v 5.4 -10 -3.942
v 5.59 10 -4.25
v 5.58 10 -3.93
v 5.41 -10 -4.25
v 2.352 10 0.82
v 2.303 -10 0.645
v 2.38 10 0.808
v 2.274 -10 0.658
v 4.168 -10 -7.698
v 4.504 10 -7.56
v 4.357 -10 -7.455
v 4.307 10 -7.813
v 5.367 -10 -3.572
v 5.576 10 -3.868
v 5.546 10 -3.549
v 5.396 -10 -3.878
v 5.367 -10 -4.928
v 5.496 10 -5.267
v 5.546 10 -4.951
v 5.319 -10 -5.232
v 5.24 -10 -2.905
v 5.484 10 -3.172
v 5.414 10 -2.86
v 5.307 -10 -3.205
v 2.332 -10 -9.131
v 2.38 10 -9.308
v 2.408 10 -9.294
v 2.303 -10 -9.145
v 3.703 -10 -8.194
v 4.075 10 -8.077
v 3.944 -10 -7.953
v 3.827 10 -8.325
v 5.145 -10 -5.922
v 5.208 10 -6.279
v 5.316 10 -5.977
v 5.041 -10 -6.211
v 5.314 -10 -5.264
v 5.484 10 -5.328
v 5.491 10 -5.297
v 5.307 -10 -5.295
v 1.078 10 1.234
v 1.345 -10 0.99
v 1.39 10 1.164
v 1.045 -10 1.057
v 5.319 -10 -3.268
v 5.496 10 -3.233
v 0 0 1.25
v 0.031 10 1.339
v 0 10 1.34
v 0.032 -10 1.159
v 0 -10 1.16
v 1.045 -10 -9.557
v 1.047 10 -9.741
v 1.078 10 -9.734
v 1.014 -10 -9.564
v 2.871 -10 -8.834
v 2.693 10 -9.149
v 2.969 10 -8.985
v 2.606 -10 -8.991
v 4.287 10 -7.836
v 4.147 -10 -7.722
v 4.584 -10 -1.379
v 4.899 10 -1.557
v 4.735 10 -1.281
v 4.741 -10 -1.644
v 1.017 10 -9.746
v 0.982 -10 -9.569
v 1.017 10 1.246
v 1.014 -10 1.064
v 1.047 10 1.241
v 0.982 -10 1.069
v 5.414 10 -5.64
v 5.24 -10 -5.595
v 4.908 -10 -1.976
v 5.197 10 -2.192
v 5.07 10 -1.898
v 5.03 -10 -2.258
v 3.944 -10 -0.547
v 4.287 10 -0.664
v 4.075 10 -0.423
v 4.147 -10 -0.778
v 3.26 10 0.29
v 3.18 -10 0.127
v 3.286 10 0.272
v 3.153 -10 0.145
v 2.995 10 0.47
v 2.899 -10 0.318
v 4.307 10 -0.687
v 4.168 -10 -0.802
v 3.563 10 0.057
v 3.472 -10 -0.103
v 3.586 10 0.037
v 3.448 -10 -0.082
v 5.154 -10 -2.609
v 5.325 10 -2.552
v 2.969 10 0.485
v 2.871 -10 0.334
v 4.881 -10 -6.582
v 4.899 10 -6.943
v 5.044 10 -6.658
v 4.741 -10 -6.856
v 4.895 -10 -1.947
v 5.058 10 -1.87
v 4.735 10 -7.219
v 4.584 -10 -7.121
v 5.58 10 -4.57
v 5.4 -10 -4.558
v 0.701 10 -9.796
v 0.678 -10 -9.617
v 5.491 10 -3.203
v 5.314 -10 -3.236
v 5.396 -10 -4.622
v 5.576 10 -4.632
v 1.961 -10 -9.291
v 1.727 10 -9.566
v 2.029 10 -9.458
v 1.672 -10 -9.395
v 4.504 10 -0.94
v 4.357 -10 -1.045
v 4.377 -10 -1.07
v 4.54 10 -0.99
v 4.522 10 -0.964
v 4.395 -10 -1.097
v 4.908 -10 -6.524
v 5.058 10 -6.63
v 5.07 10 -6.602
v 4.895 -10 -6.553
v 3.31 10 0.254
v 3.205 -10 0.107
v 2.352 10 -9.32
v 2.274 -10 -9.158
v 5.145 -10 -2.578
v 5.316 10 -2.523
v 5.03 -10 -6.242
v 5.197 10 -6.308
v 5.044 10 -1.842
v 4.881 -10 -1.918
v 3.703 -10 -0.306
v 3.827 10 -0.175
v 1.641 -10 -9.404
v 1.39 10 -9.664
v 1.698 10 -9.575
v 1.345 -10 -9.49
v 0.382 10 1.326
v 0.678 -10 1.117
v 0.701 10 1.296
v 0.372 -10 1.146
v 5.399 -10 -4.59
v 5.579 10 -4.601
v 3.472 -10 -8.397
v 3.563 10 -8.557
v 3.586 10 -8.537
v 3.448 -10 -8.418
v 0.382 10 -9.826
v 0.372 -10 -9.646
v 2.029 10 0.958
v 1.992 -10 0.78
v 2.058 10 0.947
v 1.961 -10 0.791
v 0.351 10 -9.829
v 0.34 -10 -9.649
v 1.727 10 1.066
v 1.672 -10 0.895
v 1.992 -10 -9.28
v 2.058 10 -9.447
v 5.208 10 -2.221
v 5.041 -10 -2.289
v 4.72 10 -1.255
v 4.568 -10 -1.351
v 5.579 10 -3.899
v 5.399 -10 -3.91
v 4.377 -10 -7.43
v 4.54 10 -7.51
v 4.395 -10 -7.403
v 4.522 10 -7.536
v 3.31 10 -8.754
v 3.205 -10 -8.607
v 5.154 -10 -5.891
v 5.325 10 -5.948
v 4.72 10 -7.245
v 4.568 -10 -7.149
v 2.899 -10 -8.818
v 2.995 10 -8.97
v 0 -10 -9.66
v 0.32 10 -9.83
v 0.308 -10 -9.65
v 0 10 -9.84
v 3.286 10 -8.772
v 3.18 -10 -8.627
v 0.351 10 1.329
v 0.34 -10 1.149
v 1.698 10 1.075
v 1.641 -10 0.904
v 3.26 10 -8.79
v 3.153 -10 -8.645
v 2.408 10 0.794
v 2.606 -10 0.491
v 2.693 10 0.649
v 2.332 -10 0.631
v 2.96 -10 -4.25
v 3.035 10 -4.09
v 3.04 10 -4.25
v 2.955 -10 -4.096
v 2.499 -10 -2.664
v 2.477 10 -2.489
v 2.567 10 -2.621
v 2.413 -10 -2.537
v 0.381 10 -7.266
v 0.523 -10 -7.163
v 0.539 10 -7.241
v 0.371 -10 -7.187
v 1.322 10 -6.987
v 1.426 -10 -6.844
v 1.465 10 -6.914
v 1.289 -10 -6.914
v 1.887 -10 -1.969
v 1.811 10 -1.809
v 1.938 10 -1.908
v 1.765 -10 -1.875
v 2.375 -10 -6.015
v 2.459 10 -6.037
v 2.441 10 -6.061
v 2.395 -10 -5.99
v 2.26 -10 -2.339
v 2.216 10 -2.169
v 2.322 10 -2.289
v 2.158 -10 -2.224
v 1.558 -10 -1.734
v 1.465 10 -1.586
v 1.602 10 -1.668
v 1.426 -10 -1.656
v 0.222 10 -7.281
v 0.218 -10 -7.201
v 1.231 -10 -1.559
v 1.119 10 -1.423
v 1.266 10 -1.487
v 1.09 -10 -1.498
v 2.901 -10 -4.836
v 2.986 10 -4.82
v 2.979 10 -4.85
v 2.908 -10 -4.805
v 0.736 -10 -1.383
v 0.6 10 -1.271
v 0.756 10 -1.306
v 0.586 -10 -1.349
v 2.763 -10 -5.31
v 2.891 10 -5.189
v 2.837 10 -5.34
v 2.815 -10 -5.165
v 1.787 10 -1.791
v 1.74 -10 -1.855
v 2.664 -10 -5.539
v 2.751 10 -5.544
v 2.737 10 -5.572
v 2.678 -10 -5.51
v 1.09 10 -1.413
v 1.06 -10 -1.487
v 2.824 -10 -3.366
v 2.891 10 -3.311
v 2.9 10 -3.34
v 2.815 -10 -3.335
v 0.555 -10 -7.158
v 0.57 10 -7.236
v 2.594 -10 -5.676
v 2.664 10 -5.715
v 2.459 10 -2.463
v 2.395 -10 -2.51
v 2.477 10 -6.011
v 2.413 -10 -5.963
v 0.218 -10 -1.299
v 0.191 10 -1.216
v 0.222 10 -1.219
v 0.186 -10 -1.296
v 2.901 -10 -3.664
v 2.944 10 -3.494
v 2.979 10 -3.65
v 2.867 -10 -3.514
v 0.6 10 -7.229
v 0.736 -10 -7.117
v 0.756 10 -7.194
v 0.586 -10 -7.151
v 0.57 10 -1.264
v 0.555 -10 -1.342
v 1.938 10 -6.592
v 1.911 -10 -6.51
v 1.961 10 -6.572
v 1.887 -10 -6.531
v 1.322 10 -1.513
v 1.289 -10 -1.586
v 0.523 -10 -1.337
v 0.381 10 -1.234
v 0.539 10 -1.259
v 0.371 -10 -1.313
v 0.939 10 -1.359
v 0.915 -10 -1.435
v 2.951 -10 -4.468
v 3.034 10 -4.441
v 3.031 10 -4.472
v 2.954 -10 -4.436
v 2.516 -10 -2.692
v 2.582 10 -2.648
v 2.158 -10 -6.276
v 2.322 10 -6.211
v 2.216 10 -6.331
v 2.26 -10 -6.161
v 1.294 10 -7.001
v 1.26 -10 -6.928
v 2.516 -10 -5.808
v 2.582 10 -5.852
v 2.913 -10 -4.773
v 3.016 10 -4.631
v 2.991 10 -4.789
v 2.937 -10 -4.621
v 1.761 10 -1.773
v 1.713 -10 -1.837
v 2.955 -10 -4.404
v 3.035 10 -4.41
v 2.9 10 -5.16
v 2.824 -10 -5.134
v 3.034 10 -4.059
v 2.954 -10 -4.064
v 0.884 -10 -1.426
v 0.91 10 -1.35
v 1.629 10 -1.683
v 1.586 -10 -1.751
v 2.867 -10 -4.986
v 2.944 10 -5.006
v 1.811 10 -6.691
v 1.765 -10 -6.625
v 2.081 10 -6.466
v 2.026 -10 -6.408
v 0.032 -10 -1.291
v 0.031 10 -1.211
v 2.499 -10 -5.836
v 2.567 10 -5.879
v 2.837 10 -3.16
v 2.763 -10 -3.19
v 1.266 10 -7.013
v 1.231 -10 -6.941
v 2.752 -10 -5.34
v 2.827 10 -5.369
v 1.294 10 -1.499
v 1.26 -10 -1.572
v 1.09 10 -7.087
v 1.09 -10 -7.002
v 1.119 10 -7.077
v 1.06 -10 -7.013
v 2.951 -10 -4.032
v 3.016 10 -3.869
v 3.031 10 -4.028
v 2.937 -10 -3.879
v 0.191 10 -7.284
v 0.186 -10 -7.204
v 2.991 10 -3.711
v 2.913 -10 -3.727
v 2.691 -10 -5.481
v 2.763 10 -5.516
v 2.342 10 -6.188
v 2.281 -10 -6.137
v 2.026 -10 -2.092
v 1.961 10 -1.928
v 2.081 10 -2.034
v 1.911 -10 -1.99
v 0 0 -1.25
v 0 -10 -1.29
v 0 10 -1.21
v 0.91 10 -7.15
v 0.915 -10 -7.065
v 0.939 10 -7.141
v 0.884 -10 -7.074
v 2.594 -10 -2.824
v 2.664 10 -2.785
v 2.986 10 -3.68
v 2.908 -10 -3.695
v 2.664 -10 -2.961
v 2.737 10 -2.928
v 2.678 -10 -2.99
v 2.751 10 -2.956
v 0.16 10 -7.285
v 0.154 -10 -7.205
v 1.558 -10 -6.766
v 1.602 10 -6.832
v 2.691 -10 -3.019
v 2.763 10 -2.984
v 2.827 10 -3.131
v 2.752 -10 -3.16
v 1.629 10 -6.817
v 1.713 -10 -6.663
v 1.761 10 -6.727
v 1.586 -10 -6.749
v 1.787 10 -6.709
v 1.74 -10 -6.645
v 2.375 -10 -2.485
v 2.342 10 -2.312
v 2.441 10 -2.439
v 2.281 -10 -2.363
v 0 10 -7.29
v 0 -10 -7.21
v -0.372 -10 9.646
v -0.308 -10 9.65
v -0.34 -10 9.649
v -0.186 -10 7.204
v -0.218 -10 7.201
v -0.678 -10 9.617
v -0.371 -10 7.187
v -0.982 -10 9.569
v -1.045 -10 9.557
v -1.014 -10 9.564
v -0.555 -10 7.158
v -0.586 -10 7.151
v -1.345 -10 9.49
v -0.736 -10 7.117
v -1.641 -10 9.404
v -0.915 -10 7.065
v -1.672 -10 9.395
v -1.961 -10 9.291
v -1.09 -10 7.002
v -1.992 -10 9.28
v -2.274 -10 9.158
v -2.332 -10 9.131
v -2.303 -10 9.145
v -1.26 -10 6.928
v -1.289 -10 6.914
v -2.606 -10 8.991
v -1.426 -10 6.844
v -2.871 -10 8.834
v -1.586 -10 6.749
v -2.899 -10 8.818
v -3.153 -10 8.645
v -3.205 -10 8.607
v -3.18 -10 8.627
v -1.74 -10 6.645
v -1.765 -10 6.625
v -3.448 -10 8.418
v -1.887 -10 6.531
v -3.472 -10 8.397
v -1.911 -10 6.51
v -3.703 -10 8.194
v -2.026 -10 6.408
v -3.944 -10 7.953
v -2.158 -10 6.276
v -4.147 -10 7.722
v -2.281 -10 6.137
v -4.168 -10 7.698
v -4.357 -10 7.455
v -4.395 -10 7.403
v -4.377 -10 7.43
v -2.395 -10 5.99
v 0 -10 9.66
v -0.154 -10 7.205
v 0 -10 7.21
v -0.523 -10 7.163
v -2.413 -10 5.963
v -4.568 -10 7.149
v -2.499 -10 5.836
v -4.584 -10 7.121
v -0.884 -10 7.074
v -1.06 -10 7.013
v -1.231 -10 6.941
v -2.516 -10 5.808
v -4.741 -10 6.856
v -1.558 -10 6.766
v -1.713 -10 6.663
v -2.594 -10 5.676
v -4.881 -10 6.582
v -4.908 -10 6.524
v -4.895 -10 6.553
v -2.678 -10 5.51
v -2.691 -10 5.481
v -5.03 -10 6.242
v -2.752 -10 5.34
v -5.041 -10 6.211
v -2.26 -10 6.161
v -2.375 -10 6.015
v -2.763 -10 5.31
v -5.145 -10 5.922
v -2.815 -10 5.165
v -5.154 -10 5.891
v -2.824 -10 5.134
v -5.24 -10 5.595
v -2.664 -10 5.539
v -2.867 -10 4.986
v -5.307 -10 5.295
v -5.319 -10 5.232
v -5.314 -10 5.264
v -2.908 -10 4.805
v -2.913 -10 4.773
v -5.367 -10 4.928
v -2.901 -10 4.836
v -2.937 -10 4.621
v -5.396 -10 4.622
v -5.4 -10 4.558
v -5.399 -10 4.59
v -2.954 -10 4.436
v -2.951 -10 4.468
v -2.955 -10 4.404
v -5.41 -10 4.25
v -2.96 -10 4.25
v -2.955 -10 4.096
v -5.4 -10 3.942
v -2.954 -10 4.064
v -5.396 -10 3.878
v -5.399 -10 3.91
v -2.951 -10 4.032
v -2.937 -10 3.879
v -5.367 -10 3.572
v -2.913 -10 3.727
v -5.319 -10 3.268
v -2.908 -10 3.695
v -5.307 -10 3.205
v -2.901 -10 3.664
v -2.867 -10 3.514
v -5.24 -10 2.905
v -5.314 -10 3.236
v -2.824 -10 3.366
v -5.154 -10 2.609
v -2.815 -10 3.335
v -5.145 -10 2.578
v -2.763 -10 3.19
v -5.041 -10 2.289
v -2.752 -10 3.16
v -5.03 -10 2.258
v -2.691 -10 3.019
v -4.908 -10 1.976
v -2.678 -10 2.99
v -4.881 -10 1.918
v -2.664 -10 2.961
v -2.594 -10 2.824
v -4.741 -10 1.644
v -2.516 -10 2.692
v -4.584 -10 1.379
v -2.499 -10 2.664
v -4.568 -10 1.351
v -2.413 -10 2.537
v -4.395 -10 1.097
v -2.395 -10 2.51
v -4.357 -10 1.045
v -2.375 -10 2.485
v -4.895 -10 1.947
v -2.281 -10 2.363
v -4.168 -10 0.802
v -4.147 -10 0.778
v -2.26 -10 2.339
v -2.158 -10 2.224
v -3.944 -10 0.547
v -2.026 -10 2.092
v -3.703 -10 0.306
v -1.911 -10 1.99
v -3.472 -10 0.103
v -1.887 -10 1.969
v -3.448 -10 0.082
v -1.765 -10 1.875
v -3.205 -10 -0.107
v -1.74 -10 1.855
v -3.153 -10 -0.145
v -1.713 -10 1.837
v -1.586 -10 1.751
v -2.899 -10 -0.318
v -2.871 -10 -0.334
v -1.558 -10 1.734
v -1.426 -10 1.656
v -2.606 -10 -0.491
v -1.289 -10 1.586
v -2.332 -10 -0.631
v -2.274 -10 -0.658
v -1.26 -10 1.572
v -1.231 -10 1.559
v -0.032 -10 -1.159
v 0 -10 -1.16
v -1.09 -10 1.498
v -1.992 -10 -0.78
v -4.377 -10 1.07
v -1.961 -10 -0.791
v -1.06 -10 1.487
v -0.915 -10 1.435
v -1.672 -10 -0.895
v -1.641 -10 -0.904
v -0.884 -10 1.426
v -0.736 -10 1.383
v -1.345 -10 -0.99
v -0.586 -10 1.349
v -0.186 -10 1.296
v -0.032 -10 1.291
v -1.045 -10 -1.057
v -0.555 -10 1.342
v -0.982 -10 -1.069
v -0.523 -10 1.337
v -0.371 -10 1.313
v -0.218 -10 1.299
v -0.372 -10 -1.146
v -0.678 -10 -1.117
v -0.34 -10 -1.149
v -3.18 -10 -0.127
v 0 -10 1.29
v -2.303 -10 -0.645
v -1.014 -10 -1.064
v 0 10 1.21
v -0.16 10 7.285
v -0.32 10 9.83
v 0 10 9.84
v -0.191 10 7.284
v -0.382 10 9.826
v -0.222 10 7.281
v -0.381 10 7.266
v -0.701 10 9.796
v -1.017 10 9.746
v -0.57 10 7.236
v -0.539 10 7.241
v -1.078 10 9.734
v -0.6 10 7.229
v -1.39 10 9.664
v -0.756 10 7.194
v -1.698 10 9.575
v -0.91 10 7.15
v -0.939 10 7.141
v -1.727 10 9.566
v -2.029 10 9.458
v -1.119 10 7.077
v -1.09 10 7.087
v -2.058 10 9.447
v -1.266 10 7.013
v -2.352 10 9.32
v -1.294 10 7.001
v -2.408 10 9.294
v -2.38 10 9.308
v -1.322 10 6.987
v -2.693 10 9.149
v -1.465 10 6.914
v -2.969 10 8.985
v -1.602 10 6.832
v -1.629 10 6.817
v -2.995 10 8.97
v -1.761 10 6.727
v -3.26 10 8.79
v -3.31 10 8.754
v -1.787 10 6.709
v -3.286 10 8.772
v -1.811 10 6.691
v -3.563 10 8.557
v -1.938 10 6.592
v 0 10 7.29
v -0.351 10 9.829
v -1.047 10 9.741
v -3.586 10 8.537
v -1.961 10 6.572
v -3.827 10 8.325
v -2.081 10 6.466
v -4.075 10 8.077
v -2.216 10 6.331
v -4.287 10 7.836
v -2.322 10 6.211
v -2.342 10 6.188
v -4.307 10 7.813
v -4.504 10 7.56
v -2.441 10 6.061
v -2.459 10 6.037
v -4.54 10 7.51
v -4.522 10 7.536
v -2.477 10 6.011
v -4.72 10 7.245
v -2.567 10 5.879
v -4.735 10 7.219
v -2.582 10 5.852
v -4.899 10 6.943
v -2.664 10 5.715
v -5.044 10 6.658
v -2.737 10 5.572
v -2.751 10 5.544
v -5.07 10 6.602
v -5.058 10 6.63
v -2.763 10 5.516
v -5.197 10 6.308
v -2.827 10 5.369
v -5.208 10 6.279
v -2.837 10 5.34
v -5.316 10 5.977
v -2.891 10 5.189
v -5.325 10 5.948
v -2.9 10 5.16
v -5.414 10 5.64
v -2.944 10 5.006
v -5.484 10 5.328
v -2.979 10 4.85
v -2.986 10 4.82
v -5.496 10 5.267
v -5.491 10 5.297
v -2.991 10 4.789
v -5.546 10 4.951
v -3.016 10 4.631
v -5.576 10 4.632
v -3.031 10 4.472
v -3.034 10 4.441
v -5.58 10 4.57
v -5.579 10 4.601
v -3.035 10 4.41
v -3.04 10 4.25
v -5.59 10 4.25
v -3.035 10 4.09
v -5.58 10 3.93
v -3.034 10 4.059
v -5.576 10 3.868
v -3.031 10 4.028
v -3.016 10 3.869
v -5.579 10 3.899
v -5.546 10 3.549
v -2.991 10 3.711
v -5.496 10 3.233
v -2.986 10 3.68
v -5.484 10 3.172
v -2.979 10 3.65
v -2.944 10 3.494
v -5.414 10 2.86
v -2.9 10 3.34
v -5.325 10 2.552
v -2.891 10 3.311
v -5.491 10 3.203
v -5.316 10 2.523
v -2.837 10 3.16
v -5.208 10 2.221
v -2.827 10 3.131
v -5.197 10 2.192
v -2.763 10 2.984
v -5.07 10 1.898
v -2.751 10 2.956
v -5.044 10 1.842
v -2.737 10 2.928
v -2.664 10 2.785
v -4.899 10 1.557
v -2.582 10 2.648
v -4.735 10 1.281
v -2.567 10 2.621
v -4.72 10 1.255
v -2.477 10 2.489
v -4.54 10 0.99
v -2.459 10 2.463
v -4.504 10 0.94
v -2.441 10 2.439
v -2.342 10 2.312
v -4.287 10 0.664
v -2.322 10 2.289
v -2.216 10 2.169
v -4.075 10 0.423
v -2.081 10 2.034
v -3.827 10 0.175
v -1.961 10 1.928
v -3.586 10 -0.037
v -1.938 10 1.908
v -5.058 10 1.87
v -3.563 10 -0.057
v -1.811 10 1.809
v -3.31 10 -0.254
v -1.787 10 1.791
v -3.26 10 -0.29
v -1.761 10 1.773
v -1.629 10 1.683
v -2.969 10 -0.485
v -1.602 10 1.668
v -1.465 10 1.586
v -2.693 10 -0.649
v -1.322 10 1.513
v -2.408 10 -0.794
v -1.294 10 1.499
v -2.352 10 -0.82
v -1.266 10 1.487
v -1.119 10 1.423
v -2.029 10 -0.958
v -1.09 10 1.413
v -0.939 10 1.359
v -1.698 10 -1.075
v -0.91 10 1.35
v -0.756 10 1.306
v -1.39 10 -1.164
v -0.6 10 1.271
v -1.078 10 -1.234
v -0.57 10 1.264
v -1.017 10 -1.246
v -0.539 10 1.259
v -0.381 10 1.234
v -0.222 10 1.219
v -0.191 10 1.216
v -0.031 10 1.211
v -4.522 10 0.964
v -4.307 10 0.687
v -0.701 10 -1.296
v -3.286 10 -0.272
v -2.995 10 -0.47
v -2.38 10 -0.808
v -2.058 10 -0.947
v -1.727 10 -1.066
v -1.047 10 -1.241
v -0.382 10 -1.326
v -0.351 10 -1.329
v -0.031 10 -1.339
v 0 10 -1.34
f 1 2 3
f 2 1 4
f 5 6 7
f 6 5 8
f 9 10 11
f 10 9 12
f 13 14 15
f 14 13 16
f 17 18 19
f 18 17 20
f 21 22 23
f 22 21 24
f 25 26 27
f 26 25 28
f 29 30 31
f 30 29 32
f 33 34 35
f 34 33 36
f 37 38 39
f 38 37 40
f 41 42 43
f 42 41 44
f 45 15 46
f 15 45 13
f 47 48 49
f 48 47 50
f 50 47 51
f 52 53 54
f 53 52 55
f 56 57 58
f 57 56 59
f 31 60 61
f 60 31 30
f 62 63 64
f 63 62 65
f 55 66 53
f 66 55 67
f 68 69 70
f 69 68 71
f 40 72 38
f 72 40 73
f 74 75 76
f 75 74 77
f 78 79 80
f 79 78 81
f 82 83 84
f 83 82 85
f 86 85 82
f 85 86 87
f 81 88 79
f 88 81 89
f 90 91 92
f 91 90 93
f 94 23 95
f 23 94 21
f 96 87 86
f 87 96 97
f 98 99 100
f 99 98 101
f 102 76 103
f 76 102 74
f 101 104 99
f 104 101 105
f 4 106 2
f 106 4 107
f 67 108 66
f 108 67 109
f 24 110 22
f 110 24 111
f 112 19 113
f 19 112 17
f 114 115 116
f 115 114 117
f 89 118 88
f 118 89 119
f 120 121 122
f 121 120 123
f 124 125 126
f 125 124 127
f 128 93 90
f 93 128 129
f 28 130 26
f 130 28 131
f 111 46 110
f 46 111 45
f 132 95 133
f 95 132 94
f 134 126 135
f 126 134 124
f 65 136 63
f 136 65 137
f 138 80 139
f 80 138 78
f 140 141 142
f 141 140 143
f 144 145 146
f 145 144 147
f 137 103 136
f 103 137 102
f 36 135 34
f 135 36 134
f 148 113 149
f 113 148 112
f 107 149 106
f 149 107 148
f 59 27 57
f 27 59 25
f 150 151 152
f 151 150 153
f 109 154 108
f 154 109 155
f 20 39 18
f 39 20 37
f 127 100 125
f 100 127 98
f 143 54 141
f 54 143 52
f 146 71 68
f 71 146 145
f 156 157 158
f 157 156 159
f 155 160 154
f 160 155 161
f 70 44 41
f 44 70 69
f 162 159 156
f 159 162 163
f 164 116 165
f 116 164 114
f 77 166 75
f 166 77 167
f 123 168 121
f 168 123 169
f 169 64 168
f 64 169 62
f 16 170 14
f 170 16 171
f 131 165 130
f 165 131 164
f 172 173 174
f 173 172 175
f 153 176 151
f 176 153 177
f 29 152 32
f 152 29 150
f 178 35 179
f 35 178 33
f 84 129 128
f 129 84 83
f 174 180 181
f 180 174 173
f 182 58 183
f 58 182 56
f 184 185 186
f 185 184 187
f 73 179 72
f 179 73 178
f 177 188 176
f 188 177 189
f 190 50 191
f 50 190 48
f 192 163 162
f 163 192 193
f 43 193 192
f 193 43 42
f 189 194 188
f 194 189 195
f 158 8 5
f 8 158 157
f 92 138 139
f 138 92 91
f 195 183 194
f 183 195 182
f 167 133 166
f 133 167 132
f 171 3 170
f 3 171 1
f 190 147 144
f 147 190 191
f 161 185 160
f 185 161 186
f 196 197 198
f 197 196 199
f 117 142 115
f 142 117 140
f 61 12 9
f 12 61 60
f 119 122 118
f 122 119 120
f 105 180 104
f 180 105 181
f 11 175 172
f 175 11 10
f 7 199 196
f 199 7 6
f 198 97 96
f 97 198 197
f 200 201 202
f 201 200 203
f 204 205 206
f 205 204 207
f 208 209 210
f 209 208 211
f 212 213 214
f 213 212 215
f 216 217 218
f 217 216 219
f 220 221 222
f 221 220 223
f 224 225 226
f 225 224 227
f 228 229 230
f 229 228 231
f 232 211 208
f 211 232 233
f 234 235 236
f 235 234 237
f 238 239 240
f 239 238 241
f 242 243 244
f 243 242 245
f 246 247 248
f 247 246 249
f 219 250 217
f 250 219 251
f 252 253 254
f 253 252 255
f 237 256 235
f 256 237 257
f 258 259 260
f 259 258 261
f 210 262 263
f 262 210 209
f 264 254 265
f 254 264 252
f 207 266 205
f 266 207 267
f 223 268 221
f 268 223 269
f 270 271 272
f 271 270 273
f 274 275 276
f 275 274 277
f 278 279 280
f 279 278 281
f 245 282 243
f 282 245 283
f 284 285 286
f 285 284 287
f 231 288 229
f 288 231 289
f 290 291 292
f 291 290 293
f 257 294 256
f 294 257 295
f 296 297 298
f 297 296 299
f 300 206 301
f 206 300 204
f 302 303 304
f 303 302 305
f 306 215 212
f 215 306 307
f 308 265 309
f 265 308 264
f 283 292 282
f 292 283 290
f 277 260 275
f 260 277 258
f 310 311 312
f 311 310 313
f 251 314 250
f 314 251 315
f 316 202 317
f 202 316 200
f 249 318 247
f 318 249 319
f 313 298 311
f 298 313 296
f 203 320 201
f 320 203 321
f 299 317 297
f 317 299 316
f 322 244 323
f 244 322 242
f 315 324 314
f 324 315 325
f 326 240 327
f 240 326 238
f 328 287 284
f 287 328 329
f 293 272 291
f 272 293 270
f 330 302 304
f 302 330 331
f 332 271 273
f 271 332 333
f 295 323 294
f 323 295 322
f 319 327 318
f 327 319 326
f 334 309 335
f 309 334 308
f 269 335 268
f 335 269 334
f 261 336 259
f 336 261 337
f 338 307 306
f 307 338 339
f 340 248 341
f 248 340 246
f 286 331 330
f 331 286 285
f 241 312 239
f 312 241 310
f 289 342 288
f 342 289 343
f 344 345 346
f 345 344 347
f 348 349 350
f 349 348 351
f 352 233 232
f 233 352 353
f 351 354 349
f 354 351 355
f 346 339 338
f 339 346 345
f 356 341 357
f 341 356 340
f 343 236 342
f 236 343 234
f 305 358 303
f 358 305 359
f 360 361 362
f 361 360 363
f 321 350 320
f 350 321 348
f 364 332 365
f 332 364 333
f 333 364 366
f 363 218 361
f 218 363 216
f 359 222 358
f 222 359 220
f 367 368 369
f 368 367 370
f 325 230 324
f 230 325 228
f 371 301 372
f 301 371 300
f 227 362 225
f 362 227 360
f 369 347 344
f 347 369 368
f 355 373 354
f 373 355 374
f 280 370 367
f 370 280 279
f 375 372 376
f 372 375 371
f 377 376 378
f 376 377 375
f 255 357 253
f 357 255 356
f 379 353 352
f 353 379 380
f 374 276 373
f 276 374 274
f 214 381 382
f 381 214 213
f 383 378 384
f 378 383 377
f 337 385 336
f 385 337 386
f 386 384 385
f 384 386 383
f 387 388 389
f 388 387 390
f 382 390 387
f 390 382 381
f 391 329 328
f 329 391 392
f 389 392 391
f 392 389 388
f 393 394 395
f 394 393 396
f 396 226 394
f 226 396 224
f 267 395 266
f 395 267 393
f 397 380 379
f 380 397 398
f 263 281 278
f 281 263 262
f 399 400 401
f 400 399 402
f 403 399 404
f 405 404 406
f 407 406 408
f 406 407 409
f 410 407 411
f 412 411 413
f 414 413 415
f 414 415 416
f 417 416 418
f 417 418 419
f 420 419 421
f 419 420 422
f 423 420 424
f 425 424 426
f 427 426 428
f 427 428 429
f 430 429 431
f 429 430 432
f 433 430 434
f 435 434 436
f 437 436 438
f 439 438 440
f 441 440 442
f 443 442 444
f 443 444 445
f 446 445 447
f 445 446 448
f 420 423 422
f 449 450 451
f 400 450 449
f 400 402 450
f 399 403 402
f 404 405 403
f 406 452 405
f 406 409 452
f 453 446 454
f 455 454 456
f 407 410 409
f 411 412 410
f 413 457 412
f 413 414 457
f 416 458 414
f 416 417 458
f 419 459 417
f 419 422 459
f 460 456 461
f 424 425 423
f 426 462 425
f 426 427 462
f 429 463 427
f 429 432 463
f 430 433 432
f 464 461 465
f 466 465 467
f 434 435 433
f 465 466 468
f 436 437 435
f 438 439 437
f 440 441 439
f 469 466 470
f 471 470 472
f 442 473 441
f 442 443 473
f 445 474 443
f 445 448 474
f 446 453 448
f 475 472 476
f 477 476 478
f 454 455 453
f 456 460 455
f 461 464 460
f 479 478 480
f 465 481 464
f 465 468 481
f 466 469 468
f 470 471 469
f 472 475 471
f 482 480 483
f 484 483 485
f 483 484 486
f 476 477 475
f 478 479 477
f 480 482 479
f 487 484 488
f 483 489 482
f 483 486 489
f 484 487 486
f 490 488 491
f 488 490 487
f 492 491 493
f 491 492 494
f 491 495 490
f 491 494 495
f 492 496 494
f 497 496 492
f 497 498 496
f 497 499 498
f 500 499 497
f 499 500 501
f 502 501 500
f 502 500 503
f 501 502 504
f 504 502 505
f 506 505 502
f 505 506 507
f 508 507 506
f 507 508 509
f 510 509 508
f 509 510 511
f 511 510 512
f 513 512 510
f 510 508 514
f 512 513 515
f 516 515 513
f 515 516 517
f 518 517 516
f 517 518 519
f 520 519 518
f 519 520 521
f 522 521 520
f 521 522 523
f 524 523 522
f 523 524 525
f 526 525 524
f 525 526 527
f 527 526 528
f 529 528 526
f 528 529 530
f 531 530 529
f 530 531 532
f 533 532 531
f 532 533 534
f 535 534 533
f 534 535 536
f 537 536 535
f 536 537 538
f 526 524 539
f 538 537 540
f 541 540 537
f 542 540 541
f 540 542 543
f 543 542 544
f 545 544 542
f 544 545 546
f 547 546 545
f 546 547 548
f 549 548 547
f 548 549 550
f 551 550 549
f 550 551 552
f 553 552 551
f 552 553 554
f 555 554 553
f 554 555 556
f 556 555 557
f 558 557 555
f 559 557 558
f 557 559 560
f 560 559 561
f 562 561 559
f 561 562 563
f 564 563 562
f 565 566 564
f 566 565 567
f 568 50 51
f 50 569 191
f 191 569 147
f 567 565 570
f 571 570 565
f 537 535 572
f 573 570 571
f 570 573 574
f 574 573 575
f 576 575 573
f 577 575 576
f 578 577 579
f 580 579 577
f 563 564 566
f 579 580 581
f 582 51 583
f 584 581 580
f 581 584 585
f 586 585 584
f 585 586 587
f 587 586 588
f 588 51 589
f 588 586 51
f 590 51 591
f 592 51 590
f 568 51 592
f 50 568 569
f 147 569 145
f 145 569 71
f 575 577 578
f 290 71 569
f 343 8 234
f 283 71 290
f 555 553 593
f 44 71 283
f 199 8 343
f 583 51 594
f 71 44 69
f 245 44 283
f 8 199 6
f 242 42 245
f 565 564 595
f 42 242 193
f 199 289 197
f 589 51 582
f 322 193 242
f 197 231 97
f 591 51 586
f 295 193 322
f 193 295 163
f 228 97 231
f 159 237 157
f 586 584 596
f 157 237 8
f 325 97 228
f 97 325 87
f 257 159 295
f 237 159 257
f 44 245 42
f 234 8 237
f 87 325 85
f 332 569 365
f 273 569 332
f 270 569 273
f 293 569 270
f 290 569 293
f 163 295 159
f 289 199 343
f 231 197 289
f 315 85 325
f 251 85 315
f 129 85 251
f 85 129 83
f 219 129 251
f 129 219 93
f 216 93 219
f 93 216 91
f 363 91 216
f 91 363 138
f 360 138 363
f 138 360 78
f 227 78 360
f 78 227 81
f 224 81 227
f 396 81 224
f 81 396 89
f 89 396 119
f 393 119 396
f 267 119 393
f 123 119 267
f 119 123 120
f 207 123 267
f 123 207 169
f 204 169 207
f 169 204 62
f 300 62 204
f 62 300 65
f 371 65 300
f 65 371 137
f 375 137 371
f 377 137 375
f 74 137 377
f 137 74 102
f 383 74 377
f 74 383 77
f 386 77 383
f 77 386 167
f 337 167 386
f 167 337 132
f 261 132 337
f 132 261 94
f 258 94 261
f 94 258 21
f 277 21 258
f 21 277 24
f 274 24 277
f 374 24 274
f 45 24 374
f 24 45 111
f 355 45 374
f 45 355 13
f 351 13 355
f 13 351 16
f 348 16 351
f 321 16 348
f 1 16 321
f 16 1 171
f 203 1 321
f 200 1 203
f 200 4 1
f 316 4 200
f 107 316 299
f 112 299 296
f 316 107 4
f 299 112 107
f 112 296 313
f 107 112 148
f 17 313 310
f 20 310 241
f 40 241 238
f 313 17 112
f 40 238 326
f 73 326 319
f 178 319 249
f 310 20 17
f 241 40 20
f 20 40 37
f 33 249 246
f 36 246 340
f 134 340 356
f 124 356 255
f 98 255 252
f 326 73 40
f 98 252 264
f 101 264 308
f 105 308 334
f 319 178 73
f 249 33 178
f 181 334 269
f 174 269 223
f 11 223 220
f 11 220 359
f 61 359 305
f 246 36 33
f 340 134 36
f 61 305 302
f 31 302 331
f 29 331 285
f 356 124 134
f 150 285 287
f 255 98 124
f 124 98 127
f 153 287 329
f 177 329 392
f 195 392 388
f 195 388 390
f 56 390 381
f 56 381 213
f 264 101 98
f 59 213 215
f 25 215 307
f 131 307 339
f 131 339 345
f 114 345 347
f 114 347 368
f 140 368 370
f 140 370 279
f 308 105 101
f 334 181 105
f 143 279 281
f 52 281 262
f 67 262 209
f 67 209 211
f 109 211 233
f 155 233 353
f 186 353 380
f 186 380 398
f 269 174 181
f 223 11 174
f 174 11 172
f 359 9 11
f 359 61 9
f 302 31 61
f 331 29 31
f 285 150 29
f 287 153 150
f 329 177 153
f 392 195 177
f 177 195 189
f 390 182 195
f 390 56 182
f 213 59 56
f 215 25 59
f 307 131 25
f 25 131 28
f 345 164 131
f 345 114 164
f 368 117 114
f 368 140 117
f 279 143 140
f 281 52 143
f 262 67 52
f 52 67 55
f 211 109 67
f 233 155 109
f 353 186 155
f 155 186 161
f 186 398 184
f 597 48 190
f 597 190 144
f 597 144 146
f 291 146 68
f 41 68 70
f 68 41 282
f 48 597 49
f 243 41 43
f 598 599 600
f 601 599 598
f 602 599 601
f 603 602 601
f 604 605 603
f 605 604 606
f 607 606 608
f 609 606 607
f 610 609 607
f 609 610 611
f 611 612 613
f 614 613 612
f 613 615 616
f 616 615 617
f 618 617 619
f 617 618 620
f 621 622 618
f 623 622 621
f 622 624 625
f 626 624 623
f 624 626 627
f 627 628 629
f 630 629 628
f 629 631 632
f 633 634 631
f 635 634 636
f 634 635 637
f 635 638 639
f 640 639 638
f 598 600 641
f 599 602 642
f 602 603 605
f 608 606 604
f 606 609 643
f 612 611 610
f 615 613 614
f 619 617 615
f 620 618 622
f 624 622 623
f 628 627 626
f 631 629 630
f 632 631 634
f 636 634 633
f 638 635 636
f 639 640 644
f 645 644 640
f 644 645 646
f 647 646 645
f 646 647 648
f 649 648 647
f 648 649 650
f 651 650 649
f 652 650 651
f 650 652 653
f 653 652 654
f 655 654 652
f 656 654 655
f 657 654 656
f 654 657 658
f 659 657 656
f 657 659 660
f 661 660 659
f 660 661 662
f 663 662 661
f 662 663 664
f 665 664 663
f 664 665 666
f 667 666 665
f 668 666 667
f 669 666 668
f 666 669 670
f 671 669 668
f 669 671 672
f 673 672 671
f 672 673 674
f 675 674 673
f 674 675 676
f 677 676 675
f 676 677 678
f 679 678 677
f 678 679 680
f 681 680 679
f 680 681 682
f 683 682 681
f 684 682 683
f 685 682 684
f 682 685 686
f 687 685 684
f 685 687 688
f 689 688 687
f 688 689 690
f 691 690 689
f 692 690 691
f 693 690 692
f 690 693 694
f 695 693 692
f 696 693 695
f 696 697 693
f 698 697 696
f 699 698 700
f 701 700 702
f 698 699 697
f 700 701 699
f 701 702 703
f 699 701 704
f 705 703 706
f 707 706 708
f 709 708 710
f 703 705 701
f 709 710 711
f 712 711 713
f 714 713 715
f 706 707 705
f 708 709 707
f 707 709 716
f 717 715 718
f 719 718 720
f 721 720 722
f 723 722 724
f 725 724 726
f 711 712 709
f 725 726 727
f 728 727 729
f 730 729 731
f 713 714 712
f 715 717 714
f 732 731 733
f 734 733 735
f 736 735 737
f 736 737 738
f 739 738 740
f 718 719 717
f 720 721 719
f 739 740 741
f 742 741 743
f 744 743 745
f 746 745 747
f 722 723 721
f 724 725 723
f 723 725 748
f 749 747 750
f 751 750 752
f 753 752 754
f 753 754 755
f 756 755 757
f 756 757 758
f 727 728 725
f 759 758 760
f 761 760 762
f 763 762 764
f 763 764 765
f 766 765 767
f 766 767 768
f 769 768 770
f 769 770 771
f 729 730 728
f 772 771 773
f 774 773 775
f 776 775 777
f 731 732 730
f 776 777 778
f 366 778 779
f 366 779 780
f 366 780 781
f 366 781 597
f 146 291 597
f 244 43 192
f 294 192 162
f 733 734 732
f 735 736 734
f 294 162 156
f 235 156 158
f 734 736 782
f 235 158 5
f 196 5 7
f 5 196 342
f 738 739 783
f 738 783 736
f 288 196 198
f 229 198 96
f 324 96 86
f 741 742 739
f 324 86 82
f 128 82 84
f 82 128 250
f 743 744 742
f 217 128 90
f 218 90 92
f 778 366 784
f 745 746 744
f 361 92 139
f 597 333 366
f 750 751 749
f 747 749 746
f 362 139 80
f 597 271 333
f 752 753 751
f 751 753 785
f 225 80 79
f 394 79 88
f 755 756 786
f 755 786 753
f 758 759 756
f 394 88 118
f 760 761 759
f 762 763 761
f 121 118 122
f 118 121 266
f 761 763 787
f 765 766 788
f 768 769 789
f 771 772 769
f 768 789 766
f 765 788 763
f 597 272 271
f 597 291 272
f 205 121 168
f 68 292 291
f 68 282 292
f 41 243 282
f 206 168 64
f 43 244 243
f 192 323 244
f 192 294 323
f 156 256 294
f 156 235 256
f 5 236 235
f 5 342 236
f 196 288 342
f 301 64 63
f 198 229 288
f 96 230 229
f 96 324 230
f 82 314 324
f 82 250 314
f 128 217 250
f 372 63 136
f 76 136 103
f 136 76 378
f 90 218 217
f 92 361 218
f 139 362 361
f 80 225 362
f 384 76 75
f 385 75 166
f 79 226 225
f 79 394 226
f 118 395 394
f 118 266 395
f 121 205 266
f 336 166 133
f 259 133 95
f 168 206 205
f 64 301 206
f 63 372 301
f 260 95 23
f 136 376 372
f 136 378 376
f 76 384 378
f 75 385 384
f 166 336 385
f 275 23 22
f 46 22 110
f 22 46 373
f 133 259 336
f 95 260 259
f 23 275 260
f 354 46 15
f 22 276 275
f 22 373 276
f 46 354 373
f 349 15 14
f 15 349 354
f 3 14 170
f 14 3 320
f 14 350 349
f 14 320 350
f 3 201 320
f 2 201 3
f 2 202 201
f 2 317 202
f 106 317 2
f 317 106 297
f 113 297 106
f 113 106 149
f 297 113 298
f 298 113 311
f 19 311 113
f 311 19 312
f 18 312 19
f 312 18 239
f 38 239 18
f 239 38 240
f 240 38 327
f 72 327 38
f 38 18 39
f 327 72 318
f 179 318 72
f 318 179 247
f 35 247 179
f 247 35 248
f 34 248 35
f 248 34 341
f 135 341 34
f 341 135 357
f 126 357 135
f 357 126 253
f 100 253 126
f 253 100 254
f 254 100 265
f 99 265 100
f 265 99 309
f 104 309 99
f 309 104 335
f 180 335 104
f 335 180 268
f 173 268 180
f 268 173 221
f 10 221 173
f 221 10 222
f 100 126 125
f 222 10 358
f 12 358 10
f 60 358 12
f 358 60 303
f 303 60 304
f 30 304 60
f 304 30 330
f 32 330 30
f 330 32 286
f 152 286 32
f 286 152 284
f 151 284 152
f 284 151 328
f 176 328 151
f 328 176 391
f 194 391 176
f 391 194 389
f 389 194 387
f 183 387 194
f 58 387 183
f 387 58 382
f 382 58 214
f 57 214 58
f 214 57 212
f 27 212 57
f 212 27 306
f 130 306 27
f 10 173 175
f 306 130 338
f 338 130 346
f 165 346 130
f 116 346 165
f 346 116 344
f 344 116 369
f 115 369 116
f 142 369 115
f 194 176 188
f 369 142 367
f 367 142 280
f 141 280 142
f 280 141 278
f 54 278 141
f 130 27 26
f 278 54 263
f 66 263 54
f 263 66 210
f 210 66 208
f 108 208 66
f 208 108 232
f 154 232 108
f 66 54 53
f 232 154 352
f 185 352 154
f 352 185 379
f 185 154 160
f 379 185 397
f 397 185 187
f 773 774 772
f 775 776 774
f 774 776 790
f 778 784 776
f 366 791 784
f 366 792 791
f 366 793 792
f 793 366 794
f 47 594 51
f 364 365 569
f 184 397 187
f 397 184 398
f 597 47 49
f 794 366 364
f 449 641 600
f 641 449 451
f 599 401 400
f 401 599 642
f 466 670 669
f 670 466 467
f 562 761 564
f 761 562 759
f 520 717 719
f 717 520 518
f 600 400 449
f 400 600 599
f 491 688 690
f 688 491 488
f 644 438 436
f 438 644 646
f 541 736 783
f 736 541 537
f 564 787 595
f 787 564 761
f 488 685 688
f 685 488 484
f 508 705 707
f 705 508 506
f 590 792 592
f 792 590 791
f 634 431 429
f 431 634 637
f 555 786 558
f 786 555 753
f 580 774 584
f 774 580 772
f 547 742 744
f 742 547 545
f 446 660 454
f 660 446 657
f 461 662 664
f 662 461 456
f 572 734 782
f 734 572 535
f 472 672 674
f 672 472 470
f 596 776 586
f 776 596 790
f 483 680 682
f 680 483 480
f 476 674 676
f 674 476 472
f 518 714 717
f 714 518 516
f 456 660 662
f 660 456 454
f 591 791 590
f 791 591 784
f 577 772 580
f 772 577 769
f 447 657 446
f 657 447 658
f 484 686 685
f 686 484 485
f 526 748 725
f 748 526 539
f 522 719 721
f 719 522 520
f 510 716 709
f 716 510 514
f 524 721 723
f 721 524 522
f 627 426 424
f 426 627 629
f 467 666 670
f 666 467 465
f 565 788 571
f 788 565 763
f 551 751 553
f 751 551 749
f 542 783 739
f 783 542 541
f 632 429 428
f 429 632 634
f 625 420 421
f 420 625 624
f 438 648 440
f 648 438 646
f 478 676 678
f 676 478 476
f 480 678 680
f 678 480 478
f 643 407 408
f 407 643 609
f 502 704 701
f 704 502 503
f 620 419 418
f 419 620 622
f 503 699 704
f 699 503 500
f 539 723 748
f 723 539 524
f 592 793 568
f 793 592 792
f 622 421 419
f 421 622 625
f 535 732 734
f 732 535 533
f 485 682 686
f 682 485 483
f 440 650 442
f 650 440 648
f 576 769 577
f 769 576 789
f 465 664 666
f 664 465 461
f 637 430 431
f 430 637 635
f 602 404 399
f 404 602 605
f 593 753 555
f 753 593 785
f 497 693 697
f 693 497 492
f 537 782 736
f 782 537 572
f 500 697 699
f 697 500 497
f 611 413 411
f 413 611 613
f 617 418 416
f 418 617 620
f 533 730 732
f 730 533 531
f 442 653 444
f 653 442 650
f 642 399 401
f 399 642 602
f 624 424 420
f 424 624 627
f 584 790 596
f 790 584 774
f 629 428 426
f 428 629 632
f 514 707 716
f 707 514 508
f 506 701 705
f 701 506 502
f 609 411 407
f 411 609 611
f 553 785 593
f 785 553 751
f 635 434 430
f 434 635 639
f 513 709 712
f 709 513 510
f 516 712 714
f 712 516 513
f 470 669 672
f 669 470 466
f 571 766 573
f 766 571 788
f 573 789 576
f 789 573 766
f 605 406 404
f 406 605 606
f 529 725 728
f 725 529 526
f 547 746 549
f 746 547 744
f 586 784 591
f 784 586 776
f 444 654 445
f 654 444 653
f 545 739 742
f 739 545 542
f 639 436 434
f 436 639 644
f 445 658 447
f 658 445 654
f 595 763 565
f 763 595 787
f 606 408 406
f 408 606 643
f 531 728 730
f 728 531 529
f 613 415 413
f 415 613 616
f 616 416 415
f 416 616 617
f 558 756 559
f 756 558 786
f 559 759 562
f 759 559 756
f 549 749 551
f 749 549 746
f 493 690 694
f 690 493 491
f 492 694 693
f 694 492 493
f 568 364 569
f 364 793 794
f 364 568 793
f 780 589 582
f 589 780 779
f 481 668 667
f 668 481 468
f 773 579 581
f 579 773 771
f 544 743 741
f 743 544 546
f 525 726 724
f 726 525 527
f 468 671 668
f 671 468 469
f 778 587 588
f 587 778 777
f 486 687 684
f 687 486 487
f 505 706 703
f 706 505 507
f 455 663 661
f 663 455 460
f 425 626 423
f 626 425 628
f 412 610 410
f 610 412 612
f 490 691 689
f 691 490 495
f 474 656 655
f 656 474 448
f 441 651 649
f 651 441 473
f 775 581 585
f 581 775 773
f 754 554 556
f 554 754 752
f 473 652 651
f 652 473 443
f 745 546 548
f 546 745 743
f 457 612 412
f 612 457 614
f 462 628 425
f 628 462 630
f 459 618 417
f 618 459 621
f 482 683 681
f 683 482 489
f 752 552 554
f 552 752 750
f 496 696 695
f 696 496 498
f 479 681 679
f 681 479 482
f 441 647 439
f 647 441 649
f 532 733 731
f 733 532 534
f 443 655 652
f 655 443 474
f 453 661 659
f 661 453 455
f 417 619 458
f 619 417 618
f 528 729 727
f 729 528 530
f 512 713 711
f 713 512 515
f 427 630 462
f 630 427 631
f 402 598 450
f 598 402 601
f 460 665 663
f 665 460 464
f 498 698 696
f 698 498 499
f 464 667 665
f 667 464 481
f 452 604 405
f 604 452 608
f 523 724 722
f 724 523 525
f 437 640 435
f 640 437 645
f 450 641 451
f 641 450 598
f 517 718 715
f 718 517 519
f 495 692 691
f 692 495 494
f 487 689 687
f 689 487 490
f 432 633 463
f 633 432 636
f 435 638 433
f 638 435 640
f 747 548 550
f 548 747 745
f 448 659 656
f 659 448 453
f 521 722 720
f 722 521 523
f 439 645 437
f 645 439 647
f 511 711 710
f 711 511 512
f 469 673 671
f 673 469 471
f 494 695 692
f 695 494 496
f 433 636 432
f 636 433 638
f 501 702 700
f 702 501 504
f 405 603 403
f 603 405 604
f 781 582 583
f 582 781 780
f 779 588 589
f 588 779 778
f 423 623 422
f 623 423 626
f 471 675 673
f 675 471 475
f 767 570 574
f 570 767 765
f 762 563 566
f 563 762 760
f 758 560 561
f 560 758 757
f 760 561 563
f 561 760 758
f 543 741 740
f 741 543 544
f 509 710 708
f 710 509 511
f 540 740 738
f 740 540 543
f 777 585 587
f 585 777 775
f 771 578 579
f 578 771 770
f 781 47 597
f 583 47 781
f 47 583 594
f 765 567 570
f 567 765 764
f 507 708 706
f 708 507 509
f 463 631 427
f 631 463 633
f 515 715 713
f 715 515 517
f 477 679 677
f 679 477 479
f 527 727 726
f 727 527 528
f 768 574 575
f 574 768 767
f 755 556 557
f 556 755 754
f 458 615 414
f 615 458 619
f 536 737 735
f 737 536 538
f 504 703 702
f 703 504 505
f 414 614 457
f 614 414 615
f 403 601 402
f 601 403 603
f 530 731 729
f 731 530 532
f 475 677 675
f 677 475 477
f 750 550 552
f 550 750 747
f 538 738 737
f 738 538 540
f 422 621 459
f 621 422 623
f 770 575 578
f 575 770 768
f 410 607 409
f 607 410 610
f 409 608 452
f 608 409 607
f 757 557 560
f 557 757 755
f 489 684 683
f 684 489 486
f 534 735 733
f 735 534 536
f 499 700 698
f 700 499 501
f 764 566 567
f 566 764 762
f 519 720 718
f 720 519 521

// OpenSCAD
// NOTE: RaTELSと異なり、OpenSCADは有限値しか表現できません。
// そのため、十分大きな値としてINFを定義し、使用することとします。
// これはやむを得ない対応であり、
// 減点条件「有限値をもつ楕円柱等の使用禁止」には当たらないと認識しています。
INF=1000;

// http://penguin.tantin.jp/hard/OpenSCAD/tips.html
module ellipseCylinder(h,a,b,res=100,center=false){
    resize([0,2*b,0])
    cylinder(h = h, r = a,$fn=res,center=center);
}

// NOTE: RaTELSにおける「平面との積」にあたる表現がOpenSCADには存在しません。
// 厳密には、OpenSCADにおける平面（square）は、z方向の大きさが1の直方体として表現されているため、
// RaTELSにおけるプリミティブの内外という概念を用いた平面による制約を用いることができません。
// そのため、今回は、（RaTELSにおける）平面との積を、（OpenSCADにおける）直方体との積として表現します。
// これはやむを得ない対応であり、
// 減点条件「直方体の使用禁止」には当たらないと認識しています。
module squareForIntersect(center=false){
    if (center) {
        rotate([180,0,0])
        translate([-INF/2,-INF/2,0])
        cube(size = [INF,INF,INF]);
    } else {
        rotate([180,0,0])
        cube(size = [INF,INF,INF]);
    }
}

// 選択した文字: S
union() {// 和
    intersection(){ // 積
        difference(){ // 差
            // P1: 円柱面
            // 中心座標: (0,0,-4.25)
            // 半径: 10
            // 回転角: (90,0,0)
            translate([0,0,-4.25])
            rotate([90,0,0])
            cylinder(INF, 10,$fn=100,center=true);
            
            // P2: 円柱面
            // 中心座標: (0,0,-4.25)
            // 半径: 5
            // 回転角: (90,0,0)
            translate([0,0,-4.25])
            rotate([90,0,0])
            cylinder(INF, 5,$fn=100,center=true);
        }

        // P3: 平面
        // 法線ベクトル: (0,-1,0)
        // 中心座標: (0,-10,0)
        translate([0,-10,0])
        rotate([90,0,0])
        squareForIntersect(center=true);

        // P4: 平面
        // 法線ベクトル: (0,1,0)
        // 中心座標: (0,10,0)
        translate([0,10,0])
        rotate([-90,0,0])
        squareForIntersect(center=true);

        // P5: 平面
        // 法線ベクトル: (-1,0,0)
        // 中心座標: (0,0,0)
        rotate([0,-90,0])
        squareForIntersect(center=true);
    }

    intersection(){ // 積
        difference(){ // 差
            // P6: 円柱面
            // 中心座標: (0,0,4.25)
            // 半径: 10
            // 回転角: (90,0,0)
            translate([0,0,4.25])
            rotate([90,0,0])
            cylinder(INF, 10,$fn=100,center=true);

            // P7: 円柱面
            // 中心座標: (0,0,4.25)
            // 半径: 5
            // 回転角: (90,0,0)
            translate([0,0,4.25])
            rotate([90,0,0])
            cylinder(INF, 5,$fn=100,center=true);
        }

        // P8: 平面
        // 法線ベクトル: (0,-1,0)
        // 中心座標: (0,-10,0)
        translate([0,-10,0])
        rotate([90,0,0])
        squareForIntersect(center=true);

        // P9: 平面
        // 法線ベクトル: (0,1,0)
        // 中心座標: (0,10,0)
        translate([0,10,0])
        rotate([-90,0,0])
        squareForIntersect(center=true);

        // P10: 平面
        // 法線ベクトル: (1,0,0)
        // 中心座標: (0,0,0)
        rotate([0,90,0])
        squareForIntersect(center=true);
    }
}
